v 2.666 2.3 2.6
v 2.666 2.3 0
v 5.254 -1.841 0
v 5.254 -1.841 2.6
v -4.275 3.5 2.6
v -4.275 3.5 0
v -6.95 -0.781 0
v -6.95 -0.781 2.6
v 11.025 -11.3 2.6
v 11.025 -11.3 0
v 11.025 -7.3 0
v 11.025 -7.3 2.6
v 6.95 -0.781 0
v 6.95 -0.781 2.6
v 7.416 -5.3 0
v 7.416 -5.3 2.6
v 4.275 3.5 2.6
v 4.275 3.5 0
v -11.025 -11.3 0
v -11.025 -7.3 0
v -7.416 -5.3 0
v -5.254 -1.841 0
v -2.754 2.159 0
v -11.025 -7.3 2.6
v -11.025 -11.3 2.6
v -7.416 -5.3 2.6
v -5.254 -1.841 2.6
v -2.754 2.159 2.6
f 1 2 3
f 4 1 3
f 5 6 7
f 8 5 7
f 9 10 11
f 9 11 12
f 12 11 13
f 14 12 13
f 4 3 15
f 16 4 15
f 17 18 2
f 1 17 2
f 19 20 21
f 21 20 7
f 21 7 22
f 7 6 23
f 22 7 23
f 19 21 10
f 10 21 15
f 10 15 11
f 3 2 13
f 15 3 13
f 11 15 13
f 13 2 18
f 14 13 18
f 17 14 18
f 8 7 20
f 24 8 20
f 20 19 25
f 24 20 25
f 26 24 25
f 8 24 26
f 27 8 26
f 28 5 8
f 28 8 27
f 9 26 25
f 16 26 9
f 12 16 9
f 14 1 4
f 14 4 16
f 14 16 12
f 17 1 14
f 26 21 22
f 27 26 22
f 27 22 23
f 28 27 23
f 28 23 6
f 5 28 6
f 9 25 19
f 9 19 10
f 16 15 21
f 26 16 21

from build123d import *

# Parameters (mm, degrees)
BOSS_EXTRUDE1_DEPTH = 2.6
SKETCH2_W           = 22.04953915
SKETCH2_H           = 2.6
BOSS_EXTRUDE2_DEPTH = 4


with BuildPart() as part:
    # Sketch1 → Boss-Extrude1 (new body)
    with BuildSketch(Plane.XY):
        Polygon((4.274769575, 3.5), (2.666274292, 2.3), (5.254399491, -1.841000318), (7.416274292, -5.3), (-7.416274292, -5.3), (-5.254399491, -1.841000318), (-2.754399491, 2.158999682), (-4.274769575, 3.5), (-6.950396099, -0.781002438), (-11.024769575, -7.3), (11.024769575, -7.3), (6.950396099, -0.781002438), align=None)
    extrude(amount=BOSS_EXTRUDE1_DEPTH)

    # Sketch2 → Boss-Extrude2 (add)
    with BuildSketch(Plane.XZ.offset(7.3)):
        with Locations((0, 1.3)):
            Rectangle(SKETCH2_W, SKETCH2_H)
    extrude(amount=BOSS_EXTRUDE2_DEPTH)


solid = part.part
